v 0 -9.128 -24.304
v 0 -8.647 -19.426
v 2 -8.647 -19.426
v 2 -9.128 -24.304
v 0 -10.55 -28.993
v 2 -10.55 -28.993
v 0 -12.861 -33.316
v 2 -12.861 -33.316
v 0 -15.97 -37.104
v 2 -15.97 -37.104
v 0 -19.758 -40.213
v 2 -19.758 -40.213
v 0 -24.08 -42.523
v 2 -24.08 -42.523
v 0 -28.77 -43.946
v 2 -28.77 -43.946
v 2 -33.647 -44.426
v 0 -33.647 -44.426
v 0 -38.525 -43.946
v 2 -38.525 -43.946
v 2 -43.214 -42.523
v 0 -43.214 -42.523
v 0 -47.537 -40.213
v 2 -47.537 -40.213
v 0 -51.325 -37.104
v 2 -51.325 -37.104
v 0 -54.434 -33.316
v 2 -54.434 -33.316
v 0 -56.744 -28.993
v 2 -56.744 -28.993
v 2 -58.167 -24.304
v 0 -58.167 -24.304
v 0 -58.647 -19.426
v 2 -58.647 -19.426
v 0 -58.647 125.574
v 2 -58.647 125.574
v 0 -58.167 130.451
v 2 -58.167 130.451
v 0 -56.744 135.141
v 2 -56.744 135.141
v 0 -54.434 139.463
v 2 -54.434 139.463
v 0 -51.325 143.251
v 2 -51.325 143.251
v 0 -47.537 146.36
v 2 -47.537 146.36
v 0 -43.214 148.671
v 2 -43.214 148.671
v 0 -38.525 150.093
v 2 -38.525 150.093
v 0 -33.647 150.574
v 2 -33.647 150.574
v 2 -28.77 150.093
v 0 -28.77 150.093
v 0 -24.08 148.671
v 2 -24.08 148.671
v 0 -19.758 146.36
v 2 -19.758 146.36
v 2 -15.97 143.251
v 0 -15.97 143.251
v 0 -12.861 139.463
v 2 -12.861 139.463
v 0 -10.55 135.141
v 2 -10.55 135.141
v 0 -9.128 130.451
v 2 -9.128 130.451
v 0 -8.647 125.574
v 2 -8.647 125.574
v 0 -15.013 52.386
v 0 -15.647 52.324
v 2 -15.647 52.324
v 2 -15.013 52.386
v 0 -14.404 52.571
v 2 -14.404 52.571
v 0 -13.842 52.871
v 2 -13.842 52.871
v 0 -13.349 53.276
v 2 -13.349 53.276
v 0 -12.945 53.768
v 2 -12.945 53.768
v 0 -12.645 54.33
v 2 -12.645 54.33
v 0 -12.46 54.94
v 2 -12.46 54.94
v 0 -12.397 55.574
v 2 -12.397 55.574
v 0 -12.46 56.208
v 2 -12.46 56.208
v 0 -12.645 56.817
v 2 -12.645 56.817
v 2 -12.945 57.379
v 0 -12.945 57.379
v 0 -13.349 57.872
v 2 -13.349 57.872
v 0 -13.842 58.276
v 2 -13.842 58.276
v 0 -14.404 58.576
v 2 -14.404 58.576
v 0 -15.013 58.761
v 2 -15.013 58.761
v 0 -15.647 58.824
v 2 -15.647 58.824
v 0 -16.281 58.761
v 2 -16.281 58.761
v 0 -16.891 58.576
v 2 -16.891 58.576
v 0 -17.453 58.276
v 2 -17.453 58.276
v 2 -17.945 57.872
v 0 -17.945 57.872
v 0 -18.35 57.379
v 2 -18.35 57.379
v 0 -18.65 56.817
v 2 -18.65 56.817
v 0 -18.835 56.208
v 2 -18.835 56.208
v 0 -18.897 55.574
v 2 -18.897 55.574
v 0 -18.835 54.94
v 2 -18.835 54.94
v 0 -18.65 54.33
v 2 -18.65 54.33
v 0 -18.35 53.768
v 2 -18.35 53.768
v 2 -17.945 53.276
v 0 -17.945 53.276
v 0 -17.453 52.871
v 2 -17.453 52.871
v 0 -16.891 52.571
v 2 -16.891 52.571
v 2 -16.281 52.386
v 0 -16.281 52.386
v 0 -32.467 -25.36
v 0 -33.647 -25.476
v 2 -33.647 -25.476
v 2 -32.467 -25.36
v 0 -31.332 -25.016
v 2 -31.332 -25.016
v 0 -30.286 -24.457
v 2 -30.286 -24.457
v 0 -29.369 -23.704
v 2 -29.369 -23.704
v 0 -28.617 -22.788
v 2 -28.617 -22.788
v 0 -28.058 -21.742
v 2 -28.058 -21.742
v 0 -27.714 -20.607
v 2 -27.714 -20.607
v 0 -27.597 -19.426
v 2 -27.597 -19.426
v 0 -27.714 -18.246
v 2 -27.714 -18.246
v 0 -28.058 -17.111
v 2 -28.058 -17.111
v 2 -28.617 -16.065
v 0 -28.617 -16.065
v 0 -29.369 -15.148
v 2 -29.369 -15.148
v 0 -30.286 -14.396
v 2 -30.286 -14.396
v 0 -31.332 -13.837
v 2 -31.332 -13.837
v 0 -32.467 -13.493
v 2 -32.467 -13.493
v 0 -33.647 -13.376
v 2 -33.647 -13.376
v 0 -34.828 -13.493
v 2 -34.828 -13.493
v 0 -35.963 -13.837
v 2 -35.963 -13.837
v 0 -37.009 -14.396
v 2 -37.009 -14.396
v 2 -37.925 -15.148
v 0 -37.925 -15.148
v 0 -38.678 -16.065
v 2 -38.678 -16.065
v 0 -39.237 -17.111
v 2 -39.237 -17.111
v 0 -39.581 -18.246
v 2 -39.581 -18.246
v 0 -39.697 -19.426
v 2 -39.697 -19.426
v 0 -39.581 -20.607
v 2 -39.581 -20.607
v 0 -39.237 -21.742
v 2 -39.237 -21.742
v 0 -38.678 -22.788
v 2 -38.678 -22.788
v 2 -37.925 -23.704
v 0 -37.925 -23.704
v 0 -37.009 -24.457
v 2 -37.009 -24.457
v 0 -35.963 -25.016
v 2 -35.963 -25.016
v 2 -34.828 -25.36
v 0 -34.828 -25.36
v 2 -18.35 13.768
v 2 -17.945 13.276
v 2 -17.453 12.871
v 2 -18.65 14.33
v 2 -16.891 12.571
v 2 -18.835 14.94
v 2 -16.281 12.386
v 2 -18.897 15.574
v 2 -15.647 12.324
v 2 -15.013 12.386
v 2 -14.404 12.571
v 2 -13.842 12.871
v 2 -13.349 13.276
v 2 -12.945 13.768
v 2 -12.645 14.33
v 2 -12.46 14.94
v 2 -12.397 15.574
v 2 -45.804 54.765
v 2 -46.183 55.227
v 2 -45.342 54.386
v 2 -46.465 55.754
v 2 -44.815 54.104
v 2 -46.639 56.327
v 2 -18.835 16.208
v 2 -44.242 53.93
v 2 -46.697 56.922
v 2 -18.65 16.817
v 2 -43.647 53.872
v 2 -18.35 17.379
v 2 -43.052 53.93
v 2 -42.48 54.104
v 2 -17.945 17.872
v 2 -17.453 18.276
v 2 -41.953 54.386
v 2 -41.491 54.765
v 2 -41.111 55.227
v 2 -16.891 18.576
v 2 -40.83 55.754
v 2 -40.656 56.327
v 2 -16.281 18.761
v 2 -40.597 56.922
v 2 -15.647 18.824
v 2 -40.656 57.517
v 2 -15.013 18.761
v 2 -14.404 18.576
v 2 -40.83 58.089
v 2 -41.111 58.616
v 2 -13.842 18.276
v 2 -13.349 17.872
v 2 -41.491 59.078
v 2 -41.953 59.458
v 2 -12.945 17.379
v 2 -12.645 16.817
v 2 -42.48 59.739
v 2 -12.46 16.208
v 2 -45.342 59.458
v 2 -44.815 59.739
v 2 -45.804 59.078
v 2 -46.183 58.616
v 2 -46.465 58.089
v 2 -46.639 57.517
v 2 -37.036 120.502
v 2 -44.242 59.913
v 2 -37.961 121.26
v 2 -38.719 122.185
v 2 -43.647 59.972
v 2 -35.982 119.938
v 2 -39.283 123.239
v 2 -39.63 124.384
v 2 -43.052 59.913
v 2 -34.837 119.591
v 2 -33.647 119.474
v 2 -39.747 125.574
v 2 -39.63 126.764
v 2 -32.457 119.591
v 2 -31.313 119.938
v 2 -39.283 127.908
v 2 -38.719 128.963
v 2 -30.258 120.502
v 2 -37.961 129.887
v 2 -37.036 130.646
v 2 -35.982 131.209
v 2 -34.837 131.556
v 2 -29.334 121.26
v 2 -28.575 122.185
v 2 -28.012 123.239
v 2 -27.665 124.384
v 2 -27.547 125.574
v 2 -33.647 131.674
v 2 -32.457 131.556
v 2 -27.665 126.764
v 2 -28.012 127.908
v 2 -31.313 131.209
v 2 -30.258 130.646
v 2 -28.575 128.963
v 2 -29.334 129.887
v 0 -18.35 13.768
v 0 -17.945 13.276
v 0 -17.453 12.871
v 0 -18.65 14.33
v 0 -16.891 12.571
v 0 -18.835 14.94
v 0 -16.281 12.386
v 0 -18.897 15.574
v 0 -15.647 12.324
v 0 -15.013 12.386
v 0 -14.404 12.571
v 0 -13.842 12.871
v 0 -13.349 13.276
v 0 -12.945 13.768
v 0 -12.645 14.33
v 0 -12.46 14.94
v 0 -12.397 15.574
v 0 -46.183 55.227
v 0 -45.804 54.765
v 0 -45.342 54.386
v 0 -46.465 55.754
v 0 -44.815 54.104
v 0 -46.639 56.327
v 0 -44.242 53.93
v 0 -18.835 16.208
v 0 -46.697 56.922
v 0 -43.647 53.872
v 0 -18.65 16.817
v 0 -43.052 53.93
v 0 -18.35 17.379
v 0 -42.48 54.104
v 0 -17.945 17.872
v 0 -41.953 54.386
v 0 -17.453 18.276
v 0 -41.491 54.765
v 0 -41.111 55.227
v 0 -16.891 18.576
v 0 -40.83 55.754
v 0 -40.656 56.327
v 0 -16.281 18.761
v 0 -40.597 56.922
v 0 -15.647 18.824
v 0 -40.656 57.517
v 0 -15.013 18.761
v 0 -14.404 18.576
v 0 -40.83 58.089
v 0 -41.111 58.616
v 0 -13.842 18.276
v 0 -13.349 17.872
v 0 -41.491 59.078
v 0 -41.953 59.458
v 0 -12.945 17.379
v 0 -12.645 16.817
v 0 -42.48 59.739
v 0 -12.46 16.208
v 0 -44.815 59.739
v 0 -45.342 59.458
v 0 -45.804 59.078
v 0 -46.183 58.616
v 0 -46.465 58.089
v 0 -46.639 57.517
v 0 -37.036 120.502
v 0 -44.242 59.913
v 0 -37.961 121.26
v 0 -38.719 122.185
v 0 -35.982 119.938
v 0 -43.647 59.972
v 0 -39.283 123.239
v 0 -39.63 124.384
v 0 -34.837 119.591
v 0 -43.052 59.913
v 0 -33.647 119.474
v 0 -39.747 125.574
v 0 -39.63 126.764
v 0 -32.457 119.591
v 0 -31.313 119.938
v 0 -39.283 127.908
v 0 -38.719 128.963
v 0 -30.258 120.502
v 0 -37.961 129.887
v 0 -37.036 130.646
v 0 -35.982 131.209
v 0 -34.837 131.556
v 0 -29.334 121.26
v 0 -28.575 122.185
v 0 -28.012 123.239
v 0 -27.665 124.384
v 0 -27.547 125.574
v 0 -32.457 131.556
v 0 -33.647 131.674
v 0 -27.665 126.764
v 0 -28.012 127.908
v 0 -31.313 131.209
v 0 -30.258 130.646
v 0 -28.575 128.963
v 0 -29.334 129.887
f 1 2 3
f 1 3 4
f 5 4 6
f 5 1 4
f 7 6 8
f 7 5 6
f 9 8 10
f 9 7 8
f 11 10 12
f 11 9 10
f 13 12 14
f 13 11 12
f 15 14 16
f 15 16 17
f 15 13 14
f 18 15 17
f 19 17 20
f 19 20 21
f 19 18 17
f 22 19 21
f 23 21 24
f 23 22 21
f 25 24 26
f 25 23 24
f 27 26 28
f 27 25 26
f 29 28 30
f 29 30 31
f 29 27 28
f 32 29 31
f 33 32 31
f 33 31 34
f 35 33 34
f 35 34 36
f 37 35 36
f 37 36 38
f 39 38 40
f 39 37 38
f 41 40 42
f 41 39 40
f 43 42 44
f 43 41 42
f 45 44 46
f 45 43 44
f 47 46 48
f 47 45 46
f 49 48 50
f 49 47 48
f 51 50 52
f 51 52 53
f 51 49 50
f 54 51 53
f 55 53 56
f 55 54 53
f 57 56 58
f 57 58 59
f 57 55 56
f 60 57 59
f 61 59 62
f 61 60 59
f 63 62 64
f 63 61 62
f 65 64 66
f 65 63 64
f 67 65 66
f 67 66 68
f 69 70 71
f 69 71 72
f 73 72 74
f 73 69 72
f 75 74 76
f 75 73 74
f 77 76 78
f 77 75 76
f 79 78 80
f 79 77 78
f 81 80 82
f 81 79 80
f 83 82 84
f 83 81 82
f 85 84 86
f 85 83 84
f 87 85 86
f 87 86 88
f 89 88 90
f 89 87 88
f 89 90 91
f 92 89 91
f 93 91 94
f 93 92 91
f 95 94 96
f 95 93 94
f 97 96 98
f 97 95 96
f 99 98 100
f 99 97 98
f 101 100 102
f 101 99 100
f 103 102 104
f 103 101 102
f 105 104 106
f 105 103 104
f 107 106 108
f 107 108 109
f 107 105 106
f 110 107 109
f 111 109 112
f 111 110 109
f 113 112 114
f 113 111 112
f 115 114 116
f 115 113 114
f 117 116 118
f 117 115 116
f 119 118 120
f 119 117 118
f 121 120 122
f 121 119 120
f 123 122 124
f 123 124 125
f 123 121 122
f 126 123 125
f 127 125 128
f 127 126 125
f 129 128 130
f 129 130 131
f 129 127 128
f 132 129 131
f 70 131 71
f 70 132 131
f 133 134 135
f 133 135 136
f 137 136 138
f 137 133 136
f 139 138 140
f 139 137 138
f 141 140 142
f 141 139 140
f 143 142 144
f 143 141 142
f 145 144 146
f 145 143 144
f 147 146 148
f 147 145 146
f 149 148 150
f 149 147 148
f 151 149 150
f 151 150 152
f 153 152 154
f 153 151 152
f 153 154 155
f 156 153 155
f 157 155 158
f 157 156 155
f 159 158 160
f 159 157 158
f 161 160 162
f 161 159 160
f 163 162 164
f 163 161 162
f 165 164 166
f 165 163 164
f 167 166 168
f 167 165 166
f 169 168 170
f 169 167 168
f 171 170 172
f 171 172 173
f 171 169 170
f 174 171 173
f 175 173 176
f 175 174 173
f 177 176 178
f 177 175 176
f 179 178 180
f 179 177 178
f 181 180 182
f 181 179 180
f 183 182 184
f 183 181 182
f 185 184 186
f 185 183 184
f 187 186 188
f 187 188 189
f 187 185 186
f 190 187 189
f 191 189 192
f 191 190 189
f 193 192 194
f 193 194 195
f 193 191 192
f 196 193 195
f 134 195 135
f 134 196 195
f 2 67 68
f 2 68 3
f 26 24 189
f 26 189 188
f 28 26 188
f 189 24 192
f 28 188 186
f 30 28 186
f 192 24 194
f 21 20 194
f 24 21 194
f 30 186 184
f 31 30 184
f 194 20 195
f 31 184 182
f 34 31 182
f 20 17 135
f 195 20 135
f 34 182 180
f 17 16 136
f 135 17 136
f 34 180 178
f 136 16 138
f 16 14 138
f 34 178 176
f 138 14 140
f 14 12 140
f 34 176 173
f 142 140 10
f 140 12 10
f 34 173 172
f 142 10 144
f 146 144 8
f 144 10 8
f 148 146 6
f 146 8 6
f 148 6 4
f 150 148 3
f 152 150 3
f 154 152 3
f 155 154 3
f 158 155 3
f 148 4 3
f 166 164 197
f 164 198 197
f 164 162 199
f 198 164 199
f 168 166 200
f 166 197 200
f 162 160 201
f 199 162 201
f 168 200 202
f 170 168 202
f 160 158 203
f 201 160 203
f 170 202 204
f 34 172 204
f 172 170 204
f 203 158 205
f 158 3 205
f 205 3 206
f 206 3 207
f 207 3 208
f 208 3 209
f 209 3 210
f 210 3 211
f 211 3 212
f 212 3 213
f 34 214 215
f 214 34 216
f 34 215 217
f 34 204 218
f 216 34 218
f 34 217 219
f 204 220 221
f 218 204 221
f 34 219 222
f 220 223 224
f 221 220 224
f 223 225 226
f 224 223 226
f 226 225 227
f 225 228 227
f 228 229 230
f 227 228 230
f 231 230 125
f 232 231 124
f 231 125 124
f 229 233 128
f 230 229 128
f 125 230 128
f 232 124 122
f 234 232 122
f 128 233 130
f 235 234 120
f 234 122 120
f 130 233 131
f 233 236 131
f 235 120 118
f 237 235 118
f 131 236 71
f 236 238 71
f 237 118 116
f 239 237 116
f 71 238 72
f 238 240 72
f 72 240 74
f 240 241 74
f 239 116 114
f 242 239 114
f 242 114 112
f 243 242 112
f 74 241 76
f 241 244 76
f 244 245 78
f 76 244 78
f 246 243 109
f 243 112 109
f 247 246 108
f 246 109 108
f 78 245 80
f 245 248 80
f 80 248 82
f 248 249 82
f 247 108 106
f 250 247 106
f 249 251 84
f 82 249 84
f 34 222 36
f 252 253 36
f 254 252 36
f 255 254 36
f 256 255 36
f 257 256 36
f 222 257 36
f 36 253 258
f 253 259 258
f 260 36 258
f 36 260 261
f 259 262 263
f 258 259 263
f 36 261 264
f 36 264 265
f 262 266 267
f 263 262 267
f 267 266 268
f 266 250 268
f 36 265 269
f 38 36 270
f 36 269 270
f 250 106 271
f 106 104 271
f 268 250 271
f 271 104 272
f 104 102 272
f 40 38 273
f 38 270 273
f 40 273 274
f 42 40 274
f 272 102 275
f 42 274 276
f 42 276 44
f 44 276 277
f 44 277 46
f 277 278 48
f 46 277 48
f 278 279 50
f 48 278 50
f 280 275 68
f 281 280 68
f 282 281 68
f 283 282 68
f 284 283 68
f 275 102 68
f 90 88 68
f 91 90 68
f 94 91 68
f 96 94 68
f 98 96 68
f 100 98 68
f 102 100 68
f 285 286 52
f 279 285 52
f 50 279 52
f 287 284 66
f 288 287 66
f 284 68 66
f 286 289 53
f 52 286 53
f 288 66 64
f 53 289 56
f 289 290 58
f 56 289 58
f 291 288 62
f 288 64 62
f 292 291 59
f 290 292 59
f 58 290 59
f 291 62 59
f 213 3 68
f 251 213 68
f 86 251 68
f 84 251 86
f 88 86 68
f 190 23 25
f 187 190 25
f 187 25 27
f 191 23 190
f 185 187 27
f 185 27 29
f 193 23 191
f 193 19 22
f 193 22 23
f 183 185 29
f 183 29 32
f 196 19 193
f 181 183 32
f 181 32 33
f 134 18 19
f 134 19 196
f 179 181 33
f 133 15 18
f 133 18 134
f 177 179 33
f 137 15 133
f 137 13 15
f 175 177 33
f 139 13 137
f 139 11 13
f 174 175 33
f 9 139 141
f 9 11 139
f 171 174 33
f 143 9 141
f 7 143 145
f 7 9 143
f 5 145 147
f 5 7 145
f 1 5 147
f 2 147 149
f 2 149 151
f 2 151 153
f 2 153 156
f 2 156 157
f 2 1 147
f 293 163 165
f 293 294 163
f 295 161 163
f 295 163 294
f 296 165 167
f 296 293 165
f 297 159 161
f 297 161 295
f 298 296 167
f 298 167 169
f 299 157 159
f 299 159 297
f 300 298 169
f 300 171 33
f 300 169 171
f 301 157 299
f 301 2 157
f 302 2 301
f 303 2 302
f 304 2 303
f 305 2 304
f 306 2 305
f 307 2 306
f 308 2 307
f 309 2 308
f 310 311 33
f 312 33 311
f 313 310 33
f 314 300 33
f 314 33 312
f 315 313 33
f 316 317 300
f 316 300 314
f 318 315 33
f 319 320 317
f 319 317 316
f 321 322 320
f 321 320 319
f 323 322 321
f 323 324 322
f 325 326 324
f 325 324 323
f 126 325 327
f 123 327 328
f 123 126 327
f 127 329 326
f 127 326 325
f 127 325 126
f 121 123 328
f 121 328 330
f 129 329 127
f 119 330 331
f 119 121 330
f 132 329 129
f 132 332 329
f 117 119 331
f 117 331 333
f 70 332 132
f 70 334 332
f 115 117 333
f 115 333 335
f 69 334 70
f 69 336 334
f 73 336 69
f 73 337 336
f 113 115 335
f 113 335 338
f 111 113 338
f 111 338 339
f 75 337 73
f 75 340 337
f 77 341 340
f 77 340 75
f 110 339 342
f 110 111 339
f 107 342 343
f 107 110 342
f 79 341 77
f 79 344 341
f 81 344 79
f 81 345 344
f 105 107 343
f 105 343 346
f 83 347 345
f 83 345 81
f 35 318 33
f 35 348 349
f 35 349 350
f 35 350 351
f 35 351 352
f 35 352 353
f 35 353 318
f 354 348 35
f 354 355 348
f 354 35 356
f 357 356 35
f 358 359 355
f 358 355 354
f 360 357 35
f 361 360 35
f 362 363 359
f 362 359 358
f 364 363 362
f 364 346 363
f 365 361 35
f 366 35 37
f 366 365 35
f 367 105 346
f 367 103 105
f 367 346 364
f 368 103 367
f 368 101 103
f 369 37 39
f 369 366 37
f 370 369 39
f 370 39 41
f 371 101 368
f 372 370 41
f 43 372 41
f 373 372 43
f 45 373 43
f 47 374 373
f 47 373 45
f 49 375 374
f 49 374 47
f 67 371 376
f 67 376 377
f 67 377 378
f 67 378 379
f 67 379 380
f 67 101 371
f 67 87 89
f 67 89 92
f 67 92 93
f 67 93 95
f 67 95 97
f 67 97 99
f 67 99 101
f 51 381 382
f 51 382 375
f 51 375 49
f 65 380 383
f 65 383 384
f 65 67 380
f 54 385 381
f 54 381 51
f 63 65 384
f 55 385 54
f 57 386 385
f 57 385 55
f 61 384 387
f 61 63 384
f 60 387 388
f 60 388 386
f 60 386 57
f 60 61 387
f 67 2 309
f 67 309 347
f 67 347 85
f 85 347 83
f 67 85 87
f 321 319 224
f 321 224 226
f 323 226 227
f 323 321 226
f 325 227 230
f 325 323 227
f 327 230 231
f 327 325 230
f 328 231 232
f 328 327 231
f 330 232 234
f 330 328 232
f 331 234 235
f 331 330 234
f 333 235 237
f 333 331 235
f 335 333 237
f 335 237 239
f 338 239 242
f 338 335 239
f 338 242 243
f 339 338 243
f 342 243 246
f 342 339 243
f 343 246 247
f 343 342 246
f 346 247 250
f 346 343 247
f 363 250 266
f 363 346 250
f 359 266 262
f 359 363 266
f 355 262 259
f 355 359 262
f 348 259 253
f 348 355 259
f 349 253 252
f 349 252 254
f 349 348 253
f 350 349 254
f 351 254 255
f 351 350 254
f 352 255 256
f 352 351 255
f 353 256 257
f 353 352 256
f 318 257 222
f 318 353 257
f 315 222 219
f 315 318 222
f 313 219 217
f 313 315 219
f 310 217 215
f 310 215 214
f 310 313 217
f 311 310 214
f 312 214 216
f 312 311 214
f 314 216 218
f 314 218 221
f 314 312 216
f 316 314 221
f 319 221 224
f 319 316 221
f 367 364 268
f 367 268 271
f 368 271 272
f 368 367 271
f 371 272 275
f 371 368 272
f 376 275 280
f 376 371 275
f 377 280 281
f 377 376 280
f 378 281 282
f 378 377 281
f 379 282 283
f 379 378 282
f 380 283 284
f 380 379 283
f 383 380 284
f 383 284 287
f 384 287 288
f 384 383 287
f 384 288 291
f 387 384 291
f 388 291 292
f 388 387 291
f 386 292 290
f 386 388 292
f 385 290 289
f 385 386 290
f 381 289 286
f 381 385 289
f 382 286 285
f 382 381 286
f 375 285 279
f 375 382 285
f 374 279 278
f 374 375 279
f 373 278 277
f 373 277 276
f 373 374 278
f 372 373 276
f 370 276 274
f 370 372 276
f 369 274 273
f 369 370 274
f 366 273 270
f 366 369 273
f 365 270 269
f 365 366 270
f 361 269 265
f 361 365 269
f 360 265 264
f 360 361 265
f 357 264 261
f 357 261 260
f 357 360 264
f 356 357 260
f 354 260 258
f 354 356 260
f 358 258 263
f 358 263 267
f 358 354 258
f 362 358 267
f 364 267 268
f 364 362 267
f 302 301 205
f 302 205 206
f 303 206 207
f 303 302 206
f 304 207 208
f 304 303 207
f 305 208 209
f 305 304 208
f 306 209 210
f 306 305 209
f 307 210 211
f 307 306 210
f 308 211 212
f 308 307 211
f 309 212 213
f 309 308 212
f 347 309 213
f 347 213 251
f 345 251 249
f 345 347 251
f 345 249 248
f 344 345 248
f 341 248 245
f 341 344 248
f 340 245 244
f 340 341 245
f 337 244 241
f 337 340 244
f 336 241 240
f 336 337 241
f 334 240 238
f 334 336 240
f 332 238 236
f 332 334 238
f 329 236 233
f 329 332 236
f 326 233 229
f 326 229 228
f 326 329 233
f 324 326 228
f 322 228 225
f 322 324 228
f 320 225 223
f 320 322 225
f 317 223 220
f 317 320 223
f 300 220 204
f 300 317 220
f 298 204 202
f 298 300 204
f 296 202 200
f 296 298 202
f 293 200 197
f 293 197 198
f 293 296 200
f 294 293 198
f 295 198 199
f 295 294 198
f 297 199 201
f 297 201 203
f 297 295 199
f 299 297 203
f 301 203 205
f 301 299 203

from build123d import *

# Parameters (mm, degrees)
SKETCH_1_R      = 6.05
SKETCH_1_R_2    = 6.1
SKETCH_1_R_3    = 3.05
SKETCH_1_R_4    = 3.25
EXTRUDE_1_DEPTH = 2


with BuildPart() as part:
    # 草图1 → 凸台-拉伸1 (new body)
    with BuildSketch(Plane(origin=(0, 0, 0), x_dir=(0, 0, -1), z_dir=(1, 0, 0))):
        with BuildLine():
            Line((19.426316451, -58.647367097), (-125.573683549, -58.647367097))
            ThreePointArc((-125.573683549, -58.647367097), (-150.573683549, -33.647367097), (-125.573683549, -8.647367097))
            Line((-125.573683549, -8.647367097), (4.992559722, -8.647367097))
            Line((4.992559722, -8.647367097), (19.426316451, -8.647367097))
            ThreePointArc((19.426316451, -8.647367097), (44.426316451, -33.647367097), (19.426316451, -58.647367097))
        make_face()
        with Locations((19.426316451, -33.647367097)):
            Circle(SKETCH_1_R, mode=Mode.SUBTRACT)
        with Locations((-125.573683549, -33.647367097)):
            Circle(SKETCH_1_R_2, mode=Mode.SUBTRACT)
        with Locations((-56.921571535, -43.647367097)):
            Circle(SKETCH_1_R_3, mode=Mode.SUBTRACT)
        with Locations((-15.573683549, -15.647367097)):
            Circle(SKETCH_1_R_4, mode=Mode.SUBTRACT)
        with Locations((-55.573683549, -15.647367097)):
            Circle(SKETCH_1_R_4, mode=Mode.SUBTRACT)
    extrude(amount=EXTRUDE_1_DEPTH)


solid = part.part
